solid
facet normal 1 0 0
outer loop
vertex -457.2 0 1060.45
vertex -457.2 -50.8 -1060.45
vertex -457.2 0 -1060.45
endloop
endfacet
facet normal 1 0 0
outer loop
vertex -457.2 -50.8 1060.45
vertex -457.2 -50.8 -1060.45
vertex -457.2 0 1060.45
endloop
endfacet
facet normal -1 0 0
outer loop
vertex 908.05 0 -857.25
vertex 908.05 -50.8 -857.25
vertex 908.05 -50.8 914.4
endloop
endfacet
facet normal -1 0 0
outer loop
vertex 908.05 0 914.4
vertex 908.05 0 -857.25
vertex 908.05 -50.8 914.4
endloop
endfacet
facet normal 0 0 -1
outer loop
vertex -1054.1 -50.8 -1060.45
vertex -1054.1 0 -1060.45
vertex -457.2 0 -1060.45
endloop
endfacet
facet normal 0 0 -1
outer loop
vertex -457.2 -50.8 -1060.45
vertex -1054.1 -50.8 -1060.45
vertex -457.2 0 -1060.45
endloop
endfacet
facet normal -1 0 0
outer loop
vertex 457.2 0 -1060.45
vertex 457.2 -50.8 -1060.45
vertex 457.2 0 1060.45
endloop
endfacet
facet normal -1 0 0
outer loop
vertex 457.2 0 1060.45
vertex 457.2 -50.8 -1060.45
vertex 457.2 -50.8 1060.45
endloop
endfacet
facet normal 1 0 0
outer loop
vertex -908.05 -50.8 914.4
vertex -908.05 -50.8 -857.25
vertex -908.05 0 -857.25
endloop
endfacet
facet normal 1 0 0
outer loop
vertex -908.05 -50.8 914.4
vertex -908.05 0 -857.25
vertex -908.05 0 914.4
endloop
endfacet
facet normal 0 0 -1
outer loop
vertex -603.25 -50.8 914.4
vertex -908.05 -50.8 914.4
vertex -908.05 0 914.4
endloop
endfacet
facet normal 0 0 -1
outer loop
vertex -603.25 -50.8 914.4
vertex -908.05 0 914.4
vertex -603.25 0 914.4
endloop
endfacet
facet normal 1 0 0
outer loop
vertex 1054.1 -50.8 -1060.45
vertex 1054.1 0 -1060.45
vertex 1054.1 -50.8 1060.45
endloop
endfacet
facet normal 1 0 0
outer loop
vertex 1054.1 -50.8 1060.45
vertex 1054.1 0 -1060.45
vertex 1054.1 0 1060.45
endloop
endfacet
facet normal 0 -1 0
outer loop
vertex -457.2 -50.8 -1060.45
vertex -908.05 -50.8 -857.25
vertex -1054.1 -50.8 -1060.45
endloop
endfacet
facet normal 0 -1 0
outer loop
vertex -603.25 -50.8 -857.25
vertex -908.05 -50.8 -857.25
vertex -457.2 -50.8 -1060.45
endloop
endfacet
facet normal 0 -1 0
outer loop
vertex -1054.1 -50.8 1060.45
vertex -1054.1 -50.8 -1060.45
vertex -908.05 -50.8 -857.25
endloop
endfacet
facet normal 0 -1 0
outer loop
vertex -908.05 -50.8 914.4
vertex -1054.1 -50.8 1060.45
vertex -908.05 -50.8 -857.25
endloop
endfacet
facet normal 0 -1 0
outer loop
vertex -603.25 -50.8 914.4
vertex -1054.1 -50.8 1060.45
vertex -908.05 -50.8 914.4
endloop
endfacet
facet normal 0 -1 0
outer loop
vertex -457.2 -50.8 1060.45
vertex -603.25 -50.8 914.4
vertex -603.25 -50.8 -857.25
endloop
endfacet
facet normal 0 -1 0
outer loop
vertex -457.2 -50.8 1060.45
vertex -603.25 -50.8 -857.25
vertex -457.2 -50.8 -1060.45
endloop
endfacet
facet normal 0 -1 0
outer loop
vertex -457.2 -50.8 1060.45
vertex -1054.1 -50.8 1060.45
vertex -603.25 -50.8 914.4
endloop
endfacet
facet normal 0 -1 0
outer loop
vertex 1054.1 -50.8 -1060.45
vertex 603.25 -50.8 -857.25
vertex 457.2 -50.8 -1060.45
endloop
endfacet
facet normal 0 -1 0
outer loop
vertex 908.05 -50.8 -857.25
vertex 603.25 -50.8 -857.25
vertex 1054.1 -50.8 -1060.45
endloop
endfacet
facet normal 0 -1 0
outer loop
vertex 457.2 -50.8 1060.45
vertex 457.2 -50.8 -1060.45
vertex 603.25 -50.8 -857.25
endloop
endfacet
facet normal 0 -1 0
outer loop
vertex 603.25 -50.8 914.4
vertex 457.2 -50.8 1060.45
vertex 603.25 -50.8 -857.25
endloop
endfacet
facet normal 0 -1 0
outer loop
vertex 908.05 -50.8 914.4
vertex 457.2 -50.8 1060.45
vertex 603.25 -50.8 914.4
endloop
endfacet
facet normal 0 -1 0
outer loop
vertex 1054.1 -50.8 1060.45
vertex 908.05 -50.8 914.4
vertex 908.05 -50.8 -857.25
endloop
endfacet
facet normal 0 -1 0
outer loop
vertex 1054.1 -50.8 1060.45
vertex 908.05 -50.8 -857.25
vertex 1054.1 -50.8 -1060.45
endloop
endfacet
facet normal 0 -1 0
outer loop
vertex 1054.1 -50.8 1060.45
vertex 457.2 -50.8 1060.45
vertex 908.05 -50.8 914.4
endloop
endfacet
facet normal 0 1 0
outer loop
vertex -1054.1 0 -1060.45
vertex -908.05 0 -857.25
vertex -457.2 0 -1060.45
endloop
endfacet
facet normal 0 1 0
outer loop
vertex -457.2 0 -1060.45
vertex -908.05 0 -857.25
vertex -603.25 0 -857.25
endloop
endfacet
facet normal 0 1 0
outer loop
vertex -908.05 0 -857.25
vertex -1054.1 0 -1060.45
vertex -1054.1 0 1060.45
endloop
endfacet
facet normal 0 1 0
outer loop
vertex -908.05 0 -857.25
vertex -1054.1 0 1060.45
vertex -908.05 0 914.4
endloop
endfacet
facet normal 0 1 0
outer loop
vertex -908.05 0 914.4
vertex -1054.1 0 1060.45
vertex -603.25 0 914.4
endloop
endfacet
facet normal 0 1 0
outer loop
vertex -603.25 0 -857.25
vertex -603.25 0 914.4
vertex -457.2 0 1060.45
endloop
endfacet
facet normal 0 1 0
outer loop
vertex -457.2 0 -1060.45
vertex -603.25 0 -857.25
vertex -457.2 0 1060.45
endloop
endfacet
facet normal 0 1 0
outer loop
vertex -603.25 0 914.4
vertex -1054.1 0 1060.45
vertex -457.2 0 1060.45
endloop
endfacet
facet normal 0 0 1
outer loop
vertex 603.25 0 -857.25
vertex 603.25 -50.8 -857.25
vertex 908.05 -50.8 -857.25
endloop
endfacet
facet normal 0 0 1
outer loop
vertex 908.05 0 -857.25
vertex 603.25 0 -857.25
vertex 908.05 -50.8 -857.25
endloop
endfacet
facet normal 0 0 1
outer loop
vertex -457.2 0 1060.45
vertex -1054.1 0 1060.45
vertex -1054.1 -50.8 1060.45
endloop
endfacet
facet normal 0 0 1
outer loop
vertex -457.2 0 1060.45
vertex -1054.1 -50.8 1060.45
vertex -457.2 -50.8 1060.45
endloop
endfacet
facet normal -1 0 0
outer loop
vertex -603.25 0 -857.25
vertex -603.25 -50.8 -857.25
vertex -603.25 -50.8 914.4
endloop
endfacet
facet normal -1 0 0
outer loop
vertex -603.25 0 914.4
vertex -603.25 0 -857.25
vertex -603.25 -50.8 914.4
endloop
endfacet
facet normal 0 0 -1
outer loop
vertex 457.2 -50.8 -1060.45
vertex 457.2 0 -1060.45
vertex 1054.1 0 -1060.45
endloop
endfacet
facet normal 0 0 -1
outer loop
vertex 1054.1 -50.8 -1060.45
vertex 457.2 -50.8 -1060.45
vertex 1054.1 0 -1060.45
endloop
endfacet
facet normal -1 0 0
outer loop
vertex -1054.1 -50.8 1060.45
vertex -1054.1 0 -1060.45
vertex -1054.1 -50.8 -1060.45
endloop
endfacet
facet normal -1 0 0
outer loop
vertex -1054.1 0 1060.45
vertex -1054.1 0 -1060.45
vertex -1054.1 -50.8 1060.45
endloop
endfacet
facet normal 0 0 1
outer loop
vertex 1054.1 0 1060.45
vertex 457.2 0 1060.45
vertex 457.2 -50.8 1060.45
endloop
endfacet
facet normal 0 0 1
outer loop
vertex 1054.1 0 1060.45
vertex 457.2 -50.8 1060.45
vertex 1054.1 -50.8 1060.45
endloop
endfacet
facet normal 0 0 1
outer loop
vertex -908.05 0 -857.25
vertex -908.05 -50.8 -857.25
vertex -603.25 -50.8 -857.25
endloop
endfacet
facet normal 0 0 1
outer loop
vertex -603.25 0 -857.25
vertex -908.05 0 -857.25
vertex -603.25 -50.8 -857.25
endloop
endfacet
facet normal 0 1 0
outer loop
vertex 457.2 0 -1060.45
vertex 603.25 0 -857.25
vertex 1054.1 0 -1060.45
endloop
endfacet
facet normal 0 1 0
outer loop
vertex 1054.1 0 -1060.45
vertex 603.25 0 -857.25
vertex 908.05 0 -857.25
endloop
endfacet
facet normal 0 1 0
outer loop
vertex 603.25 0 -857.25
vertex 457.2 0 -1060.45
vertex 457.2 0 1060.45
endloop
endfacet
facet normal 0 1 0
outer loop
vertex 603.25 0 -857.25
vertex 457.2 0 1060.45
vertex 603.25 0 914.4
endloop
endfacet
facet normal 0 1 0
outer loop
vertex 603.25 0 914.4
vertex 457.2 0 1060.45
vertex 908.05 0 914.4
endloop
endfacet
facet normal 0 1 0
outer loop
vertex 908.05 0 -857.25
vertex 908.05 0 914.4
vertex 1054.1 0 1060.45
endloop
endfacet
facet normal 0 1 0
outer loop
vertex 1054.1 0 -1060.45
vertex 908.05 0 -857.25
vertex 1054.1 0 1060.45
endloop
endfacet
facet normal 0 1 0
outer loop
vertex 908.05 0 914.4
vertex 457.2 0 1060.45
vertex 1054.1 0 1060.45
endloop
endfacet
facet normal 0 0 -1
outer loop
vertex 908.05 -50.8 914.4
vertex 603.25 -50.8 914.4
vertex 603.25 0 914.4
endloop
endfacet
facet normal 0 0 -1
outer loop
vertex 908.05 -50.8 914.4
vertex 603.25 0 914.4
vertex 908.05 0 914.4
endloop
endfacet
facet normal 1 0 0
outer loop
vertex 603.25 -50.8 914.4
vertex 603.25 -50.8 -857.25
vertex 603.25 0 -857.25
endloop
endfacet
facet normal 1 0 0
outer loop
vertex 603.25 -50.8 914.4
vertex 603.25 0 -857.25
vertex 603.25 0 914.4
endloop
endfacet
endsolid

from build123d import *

# Parameters (mm, degrees)
F0_W     = 2108.2
F0_H     = 2120.9
F1_DEPTH = 50.8
F2_W     = 914.4
F2_H     = 2120.9
F3_DEPTH = 12.7
F4_R     = 25.4
F5_DEPTH = 38.101
F6_W     = 304.8
F6_H     = 1771.65
F7_DEPTH = 50.801
F8_DEPTH = 50.801


with BuildPart() as f1:
    # F0 (on Front) → F1 (new body)
    with BuildSketch(Plane.XZ):
        Rectangle(F0_W, F0_H)
    extrude(amount=F1_DEPTH)

    # F2 (on face) → F3 (cut)
    with BuildSketch(Plane.XZ.offset(50.8)):
        Rectangle(F2_W, F2_H)
    extrude(amount=-F3_DEPTH, mode=Mode.SUBTRACT)

    # F4 (on face) → F5 (cut, through all)
    with BuildSketch(Plane.XZ.offset(38.1)):
        with Locations((406.4, 0)):
            Circle(F4_R)
    extrude(amount=-F5_DEPTH, mode=Mode.SUBTRACT)

    # F6 (on face) → F7 (cut, through all)
    with BuildSketch(Plane.XZ.offset(50.8)):
        with Locations((-755.65, 28.575)):
            Rectangle(F6_W, F6_H)
        with Locations((755.65, 28.575)):
            Rectangle(F6_W, F6_H)
    extrude(amount=-F7_DEPTH, mode=Mode.SUBTRACT)

    # F2 (on face) → F8 (cut, through all)
    with BuildSketch(Plane.XZ.offset(50.8)):
        Rectangle(F2_W, F2_H)
    extrude(amount=-F8_DEPTH, mode=Mode.SUBTRACT)


solid = f1.part
